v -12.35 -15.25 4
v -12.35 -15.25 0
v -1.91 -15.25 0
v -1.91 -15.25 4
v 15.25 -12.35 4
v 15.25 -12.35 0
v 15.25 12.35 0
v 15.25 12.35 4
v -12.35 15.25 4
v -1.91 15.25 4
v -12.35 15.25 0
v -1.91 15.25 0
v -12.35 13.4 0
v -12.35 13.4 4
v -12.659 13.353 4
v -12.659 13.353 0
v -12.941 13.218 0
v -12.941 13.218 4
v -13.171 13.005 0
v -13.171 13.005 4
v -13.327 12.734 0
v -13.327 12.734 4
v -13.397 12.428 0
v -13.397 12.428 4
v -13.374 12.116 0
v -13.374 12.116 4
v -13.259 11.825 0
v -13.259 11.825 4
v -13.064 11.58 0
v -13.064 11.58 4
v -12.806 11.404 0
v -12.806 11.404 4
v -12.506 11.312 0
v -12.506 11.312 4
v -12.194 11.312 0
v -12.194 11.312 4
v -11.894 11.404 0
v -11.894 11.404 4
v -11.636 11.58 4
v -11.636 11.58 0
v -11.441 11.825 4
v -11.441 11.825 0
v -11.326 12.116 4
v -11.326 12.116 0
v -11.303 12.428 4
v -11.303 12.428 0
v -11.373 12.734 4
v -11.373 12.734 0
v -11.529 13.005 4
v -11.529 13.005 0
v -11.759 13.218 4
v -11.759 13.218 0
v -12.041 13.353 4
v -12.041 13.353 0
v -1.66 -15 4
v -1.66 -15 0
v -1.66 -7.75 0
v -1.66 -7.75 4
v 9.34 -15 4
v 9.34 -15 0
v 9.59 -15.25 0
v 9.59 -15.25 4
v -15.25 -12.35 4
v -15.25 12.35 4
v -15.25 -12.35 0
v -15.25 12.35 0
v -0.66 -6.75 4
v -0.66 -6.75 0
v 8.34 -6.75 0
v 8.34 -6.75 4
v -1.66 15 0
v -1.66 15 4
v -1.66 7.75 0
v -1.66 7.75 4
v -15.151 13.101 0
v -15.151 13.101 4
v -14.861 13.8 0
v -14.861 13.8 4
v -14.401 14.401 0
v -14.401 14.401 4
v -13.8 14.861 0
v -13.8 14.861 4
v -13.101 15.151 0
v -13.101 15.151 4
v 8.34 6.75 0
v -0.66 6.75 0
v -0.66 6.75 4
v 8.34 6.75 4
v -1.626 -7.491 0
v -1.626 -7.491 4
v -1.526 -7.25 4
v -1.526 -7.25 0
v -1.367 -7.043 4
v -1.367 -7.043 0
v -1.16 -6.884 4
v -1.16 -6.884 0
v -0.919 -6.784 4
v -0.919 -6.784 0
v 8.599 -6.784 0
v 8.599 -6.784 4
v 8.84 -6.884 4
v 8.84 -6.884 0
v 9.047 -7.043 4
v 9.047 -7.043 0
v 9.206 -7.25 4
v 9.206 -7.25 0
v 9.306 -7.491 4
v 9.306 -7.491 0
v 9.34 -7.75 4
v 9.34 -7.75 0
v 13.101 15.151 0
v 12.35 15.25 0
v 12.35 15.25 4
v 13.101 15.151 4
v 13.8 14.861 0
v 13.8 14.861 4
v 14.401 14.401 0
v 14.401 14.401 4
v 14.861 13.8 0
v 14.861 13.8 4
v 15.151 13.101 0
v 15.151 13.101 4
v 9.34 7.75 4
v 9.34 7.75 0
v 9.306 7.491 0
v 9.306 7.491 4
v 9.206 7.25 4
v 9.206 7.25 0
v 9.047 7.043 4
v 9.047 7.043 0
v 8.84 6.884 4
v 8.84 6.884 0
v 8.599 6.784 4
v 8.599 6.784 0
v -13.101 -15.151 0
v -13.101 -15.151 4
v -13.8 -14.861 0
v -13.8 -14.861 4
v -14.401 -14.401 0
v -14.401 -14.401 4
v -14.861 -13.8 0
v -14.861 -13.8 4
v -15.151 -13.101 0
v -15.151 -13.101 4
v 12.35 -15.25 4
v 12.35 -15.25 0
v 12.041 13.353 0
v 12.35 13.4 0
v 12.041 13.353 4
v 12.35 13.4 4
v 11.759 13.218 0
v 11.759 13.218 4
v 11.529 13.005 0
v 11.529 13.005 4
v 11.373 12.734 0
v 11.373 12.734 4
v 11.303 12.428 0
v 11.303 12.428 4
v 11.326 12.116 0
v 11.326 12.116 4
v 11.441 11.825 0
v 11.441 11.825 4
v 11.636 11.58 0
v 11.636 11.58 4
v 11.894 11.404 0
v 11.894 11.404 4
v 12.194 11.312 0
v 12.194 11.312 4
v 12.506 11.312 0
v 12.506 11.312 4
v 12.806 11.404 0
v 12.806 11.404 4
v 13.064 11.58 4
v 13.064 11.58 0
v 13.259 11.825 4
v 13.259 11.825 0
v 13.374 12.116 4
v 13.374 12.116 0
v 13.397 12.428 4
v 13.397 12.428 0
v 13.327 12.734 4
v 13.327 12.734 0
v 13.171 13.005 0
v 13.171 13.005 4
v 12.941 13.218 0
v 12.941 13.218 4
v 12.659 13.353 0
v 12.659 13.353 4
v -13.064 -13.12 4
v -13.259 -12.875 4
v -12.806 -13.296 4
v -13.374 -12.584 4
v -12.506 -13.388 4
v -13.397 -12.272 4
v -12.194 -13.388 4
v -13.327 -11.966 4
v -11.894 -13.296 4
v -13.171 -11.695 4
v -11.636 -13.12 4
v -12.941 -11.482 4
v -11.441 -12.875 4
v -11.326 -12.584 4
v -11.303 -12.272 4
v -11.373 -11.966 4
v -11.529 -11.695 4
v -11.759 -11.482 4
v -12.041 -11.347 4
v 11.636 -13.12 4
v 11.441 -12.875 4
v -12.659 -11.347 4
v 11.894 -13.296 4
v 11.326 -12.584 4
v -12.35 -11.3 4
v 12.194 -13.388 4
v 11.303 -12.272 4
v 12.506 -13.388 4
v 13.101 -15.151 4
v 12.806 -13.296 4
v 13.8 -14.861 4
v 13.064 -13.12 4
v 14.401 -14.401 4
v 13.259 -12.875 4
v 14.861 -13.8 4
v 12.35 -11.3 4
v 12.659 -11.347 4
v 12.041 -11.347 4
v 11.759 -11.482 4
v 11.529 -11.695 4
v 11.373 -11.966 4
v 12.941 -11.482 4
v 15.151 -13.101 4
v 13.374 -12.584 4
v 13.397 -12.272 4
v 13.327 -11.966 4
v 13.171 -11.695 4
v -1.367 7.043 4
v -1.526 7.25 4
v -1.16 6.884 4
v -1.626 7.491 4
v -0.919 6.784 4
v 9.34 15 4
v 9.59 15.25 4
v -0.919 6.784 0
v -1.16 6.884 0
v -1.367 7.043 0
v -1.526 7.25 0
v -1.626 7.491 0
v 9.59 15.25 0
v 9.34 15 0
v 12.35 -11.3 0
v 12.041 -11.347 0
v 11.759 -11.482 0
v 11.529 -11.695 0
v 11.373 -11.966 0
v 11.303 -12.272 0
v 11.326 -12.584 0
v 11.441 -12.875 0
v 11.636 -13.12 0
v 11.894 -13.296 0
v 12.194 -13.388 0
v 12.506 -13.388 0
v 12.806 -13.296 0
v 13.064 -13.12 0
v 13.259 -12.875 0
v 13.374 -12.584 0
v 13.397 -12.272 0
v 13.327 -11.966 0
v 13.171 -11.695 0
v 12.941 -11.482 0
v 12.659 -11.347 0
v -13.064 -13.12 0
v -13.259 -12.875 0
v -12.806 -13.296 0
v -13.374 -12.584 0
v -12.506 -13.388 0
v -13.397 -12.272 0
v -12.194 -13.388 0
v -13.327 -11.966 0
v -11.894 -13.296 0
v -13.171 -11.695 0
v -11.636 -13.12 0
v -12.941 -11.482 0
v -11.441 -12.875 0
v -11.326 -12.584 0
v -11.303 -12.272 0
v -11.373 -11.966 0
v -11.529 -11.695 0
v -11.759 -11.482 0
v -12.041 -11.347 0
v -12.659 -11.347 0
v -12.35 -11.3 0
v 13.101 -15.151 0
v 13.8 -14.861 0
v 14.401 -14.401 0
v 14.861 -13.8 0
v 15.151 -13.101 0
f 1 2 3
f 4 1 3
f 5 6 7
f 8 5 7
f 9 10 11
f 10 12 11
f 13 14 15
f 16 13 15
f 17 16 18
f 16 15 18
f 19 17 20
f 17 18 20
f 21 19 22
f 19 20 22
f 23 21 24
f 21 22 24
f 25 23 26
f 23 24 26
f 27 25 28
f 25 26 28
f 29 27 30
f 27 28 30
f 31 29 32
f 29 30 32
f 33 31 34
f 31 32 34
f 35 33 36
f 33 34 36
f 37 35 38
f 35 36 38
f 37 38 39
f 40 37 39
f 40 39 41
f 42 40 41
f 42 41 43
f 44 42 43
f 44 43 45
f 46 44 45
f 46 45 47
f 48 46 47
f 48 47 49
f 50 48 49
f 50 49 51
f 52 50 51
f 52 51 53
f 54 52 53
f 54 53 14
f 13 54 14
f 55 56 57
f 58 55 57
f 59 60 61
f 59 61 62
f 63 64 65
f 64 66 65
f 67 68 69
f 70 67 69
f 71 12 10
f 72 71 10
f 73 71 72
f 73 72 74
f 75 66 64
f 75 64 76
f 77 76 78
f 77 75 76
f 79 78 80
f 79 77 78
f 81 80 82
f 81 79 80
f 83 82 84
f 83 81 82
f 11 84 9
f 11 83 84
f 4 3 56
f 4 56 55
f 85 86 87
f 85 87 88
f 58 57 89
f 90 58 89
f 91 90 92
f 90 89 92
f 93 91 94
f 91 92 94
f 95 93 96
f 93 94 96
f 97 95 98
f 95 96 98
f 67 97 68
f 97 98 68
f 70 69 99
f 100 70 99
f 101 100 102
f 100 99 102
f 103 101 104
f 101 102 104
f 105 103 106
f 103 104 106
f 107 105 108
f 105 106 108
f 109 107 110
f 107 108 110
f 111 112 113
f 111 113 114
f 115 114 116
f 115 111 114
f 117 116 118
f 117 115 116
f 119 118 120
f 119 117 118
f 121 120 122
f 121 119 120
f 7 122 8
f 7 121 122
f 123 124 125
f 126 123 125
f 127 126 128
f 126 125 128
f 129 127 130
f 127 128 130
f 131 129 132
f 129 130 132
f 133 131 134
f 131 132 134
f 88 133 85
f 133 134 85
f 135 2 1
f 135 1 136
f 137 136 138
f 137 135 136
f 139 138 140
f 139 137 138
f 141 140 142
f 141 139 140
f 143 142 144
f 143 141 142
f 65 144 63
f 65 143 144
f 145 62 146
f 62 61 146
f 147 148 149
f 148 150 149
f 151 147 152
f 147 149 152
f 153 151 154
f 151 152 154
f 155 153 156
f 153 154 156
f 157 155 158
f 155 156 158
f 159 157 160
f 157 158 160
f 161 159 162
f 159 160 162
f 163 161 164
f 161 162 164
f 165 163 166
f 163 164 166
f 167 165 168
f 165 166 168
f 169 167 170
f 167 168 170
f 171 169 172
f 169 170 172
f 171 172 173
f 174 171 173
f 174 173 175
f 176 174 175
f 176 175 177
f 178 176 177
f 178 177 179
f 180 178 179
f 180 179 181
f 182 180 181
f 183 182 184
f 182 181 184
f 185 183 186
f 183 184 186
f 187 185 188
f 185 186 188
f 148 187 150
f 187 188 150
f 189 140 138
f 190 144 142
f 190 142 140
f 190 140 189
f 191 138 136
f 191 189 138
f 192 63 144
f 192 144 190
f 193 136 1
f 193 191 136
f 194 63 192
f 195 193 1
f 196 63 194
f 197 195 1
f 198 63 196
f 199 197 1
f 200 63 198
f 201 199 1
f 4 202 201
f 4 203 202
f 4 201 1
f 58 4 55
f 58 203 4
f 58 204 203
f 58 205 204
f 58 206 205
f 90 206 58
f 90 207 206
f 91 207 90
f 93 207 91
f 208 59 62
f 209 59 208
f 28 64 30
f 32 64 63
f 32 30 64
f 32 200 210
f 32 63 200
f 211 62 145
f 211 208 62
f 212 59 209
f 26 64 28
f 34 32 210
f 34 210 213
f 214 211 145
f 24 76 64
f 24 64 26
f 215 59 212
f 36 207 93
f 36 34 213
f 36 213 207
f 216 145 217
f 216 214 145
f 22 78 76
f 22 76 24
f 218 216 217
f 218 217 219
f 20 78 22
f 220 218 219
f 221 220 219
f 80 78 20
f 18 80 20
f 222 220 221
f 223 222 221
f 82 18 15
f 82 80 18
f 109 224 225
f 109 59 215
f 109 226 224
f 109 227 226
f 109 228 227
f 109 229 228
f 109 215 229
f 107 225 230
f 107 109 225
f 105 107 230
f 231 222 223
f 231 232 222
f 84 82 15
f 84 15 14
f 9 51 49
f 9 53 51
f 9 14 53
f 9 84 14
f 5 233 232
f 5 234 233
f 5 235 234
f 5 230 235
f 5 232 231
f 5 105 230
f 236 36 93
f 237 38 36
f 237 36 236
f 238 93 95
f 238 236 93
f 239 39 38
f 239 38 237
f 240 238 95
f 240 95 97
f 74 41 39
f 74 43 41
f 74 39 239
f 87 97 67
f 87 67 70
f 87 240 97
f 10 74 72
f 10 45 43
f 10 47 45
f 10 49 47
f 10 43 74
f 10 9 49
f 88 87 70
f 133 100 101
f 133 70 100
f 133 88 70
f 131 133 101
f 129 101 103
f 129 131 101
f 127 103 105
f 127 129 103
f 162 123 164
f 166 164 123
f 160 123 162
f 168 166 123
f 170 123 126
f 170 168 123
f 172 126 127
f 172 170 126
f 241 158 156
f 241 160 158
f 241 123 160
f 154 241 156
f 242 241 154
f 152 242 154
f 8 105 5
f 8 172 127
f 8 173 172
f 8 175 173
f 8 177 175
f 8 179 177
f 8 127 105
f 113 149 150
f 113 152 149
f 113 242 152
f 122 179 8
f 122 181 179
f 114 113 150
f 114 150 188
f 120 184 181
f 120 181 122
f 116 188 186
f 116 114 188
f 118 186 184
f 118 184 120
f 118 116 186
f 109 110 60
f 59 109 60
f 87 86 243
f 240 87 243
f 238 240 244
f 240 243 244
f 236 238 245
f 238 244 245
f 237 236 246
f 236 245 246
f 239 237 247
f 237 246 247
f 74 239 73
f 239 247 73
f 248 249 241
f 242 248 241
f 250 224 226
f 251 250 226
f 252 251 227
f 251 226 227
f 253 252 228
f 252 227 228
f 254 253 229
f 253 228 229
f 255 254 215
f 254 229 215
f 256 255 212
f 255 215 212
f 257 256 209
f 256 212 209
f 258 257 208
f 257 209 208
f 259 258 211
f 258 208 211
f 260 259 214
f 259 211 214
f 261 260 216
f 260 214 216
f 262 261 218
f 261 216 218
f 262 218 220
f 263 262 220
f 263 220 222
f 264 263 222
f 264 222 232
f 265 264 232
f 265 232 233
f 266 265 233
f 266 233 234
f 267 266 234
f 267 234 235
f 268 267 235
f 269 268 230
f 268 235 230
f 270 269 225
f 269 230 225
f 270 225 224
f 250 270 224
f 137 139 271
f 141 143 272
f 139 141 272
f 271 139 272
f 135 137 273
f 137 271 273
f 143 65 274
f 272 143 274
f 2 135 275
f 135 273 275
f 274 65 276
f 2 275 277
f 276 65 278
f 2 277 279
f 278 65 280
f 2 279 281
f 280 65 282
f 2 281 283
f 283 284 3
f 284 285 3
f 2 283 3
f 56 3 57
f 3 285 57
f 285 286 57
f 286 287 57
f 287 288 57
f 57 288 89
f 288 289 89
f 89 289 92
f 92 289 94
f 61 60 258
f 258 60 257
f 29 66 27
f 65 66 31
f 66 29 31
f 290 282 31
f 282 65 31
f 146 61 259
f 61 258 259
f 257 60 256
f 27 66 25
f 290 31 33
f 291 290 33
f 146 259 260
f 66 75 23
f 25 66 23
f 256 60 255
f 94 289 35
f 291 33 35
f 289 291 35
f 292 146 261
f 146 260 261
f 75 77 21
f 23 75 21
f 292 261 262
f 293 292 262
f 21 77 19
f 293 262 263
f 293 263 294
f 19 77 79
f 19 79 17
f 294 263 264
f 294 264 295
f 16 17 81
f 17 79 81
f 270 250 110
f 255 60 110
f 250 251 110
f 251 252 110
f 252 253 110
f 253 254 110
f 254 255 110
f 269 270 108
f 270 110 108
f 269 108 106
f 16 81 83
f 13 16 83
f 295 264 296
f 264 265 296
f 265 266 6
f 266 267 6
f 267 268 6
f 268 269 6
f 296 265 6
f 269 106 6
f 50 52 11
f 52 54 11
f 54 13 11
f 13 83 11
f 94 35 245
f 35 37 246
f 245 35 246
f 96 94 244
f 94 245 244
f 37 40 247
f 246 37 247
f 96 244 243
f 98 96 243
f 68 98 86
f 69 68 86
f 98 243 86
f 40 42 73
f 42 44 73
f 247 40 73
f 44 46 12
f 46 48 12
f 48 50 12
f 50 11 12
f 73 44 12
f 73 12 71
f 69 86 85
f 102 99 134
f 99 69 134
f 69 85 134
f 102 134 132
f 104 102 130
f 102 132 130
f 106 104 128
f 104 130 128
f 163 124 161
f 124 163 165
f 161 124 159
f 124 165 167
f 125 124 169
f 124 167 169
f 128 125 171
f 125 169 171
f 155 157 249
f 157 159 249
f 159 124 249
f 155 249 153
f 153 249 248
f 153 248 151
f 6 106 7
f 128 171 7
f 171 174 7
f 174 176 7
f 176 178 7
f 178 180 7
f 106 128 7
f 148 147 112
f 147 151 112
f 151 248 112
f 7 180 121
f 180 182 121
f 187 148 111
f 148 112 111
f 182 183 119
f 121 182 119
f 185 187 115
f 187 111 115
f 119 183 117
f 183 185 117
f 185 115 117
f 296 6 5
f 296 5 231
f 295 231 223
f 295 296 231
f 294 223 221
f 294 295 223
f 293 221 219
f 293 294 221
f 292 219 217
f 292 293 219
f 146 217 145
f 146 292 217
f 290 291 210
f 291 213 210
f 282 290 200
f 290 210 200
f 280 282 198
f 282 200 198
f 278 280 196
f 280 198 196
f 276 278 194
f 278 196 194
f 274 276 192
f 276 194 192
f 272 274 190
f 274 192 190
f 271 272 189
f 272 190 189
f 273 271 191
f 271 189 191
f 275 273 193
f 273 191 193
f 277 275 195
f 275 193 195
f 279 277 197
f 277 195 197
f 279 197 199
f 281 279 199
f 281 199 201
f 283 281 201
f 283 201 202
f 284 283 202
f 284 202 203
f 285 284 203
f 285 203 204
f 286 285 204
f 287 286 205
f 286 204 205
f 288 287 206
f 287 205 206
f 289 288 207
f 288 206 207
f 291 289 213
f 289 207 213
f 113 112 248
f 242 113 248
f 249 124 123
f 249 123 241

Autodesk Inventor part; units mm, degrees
ref_plane "YZ Plane" through (0, 0, 0) normal (1, 0, 0) x (0, 1, 0)
ref_plane "XZ Plane" through (0, 0, 0) normal (0, 1, 0) x (-1, 0, 0)
ref_plane "XY Plane" through (0, 0, 0) normal (0, 0, 1) x (1, 0, 0)
sketch "スケッチ1" plane through (0, 0, 0) normal (0, 0, 1) x (1, 0, 0)
  line L0 (12.35, 15.25) -> (9.34, 15.25)
  line L1 (-15.25, 12.35) -> (-15.25, -12.35)
  line L2 (-12.35, -15.25) -> (-1.66, -15.25)
  line L3 (15.25, -12.35) -> (15.25, 12.35)
  line L4 (-0.66, 6.75) -> (8.34, 6.75)
  line L5 (9.34, 7.75) -> (9.34, 15.25)
  line L6 (-0.66, -6.75) -> (8.34, -6.75)
  line L7 (9.34, -7.75) -> (9.34, -15.25)
  line L8 (9.34, 15.25) -> (-1.66, 15.25) construction
  line L9 (-1.66, 15.25) -> (-12.35, 15.25)
  line L10 (9.34, -15.25) -> (12.35, -15.25)
  line L11 (-1.66, -15.25) -> (9.34, -15.25) construction
  line L12 (-1.66, 15.25) -> (-1.66, 7.75)
  line L13 (-1.66, -15.25) -> (-1.66, -7.75)
  arc A0 (15.25, 12.35) -> (12.35, 15.25) centre (12.35, 12.35) ccw
  arc A1 (12.35, -15.25) -> (15.25, -12.35) centre (12.35, -12.35) ccw
  arc A2 (-15.25, -12.35) -> (-12.35, -15.25) centre (-12.35, -12.35) ccw
  arc A3 (-12.35, 15.25) -> (-15.25, 12.35) centre (-12.35, 12.35) ccw
  arc A4 (-1.66, 7.75) -> (-0.66, 6.75) centre (-0.66, 7.75) ccw
  arc A5 (8.34, 6.75) -> (9.34, 7.75) centre (8.34, 7.75) ccw
  arc A6 (9.34, -7.75) -> (8.34, -6.75) centre (8.34, -7.75) ccw
  arc A7 (-0.66, -6.75) -> (-1.66, -7.75) centre (-0.66, -7.75) ccw
  line L14 (0, 0) -> (0, -35.1049) construction
  line L15 (0, 0) -> (30.4007, 0) construction
  line L16 (3.84, -9) -> (3.84, -1.2529) construction
  arc A8 (15.35, 12.35) -> (12.35, 15.35) centre (12.35, 12.35) ccw construction
  dimension "d0" = 2.9
  dimension "d1" = 1
  dimension "d14" = 8.5
  dimension "d15" = 11
  dimension "d16" = 3.84
  dimension "d17" = 8.5
  dimension "d21" = 3
extrude "押し出し1" add sketch "スケッチ1" along normal blind 4
hole "穴1" at (12.35, 12.35, 0) at (12.35, -12.35, 0) at (-12.35, -12.35, 0) at (-12.35, 12.35, 0) direction (0, 0, 1) diameter 2.1 end through all
chamfer "面取り1" distance 0.25 angle 45 4 edges at (9.34, 15.25, 2) (-1.66, 15.25, 2) (-1.66, -15.25, 2) (9.34, -15.25, 2)
properties part number "QUIKS_SINGLE_COVER"
